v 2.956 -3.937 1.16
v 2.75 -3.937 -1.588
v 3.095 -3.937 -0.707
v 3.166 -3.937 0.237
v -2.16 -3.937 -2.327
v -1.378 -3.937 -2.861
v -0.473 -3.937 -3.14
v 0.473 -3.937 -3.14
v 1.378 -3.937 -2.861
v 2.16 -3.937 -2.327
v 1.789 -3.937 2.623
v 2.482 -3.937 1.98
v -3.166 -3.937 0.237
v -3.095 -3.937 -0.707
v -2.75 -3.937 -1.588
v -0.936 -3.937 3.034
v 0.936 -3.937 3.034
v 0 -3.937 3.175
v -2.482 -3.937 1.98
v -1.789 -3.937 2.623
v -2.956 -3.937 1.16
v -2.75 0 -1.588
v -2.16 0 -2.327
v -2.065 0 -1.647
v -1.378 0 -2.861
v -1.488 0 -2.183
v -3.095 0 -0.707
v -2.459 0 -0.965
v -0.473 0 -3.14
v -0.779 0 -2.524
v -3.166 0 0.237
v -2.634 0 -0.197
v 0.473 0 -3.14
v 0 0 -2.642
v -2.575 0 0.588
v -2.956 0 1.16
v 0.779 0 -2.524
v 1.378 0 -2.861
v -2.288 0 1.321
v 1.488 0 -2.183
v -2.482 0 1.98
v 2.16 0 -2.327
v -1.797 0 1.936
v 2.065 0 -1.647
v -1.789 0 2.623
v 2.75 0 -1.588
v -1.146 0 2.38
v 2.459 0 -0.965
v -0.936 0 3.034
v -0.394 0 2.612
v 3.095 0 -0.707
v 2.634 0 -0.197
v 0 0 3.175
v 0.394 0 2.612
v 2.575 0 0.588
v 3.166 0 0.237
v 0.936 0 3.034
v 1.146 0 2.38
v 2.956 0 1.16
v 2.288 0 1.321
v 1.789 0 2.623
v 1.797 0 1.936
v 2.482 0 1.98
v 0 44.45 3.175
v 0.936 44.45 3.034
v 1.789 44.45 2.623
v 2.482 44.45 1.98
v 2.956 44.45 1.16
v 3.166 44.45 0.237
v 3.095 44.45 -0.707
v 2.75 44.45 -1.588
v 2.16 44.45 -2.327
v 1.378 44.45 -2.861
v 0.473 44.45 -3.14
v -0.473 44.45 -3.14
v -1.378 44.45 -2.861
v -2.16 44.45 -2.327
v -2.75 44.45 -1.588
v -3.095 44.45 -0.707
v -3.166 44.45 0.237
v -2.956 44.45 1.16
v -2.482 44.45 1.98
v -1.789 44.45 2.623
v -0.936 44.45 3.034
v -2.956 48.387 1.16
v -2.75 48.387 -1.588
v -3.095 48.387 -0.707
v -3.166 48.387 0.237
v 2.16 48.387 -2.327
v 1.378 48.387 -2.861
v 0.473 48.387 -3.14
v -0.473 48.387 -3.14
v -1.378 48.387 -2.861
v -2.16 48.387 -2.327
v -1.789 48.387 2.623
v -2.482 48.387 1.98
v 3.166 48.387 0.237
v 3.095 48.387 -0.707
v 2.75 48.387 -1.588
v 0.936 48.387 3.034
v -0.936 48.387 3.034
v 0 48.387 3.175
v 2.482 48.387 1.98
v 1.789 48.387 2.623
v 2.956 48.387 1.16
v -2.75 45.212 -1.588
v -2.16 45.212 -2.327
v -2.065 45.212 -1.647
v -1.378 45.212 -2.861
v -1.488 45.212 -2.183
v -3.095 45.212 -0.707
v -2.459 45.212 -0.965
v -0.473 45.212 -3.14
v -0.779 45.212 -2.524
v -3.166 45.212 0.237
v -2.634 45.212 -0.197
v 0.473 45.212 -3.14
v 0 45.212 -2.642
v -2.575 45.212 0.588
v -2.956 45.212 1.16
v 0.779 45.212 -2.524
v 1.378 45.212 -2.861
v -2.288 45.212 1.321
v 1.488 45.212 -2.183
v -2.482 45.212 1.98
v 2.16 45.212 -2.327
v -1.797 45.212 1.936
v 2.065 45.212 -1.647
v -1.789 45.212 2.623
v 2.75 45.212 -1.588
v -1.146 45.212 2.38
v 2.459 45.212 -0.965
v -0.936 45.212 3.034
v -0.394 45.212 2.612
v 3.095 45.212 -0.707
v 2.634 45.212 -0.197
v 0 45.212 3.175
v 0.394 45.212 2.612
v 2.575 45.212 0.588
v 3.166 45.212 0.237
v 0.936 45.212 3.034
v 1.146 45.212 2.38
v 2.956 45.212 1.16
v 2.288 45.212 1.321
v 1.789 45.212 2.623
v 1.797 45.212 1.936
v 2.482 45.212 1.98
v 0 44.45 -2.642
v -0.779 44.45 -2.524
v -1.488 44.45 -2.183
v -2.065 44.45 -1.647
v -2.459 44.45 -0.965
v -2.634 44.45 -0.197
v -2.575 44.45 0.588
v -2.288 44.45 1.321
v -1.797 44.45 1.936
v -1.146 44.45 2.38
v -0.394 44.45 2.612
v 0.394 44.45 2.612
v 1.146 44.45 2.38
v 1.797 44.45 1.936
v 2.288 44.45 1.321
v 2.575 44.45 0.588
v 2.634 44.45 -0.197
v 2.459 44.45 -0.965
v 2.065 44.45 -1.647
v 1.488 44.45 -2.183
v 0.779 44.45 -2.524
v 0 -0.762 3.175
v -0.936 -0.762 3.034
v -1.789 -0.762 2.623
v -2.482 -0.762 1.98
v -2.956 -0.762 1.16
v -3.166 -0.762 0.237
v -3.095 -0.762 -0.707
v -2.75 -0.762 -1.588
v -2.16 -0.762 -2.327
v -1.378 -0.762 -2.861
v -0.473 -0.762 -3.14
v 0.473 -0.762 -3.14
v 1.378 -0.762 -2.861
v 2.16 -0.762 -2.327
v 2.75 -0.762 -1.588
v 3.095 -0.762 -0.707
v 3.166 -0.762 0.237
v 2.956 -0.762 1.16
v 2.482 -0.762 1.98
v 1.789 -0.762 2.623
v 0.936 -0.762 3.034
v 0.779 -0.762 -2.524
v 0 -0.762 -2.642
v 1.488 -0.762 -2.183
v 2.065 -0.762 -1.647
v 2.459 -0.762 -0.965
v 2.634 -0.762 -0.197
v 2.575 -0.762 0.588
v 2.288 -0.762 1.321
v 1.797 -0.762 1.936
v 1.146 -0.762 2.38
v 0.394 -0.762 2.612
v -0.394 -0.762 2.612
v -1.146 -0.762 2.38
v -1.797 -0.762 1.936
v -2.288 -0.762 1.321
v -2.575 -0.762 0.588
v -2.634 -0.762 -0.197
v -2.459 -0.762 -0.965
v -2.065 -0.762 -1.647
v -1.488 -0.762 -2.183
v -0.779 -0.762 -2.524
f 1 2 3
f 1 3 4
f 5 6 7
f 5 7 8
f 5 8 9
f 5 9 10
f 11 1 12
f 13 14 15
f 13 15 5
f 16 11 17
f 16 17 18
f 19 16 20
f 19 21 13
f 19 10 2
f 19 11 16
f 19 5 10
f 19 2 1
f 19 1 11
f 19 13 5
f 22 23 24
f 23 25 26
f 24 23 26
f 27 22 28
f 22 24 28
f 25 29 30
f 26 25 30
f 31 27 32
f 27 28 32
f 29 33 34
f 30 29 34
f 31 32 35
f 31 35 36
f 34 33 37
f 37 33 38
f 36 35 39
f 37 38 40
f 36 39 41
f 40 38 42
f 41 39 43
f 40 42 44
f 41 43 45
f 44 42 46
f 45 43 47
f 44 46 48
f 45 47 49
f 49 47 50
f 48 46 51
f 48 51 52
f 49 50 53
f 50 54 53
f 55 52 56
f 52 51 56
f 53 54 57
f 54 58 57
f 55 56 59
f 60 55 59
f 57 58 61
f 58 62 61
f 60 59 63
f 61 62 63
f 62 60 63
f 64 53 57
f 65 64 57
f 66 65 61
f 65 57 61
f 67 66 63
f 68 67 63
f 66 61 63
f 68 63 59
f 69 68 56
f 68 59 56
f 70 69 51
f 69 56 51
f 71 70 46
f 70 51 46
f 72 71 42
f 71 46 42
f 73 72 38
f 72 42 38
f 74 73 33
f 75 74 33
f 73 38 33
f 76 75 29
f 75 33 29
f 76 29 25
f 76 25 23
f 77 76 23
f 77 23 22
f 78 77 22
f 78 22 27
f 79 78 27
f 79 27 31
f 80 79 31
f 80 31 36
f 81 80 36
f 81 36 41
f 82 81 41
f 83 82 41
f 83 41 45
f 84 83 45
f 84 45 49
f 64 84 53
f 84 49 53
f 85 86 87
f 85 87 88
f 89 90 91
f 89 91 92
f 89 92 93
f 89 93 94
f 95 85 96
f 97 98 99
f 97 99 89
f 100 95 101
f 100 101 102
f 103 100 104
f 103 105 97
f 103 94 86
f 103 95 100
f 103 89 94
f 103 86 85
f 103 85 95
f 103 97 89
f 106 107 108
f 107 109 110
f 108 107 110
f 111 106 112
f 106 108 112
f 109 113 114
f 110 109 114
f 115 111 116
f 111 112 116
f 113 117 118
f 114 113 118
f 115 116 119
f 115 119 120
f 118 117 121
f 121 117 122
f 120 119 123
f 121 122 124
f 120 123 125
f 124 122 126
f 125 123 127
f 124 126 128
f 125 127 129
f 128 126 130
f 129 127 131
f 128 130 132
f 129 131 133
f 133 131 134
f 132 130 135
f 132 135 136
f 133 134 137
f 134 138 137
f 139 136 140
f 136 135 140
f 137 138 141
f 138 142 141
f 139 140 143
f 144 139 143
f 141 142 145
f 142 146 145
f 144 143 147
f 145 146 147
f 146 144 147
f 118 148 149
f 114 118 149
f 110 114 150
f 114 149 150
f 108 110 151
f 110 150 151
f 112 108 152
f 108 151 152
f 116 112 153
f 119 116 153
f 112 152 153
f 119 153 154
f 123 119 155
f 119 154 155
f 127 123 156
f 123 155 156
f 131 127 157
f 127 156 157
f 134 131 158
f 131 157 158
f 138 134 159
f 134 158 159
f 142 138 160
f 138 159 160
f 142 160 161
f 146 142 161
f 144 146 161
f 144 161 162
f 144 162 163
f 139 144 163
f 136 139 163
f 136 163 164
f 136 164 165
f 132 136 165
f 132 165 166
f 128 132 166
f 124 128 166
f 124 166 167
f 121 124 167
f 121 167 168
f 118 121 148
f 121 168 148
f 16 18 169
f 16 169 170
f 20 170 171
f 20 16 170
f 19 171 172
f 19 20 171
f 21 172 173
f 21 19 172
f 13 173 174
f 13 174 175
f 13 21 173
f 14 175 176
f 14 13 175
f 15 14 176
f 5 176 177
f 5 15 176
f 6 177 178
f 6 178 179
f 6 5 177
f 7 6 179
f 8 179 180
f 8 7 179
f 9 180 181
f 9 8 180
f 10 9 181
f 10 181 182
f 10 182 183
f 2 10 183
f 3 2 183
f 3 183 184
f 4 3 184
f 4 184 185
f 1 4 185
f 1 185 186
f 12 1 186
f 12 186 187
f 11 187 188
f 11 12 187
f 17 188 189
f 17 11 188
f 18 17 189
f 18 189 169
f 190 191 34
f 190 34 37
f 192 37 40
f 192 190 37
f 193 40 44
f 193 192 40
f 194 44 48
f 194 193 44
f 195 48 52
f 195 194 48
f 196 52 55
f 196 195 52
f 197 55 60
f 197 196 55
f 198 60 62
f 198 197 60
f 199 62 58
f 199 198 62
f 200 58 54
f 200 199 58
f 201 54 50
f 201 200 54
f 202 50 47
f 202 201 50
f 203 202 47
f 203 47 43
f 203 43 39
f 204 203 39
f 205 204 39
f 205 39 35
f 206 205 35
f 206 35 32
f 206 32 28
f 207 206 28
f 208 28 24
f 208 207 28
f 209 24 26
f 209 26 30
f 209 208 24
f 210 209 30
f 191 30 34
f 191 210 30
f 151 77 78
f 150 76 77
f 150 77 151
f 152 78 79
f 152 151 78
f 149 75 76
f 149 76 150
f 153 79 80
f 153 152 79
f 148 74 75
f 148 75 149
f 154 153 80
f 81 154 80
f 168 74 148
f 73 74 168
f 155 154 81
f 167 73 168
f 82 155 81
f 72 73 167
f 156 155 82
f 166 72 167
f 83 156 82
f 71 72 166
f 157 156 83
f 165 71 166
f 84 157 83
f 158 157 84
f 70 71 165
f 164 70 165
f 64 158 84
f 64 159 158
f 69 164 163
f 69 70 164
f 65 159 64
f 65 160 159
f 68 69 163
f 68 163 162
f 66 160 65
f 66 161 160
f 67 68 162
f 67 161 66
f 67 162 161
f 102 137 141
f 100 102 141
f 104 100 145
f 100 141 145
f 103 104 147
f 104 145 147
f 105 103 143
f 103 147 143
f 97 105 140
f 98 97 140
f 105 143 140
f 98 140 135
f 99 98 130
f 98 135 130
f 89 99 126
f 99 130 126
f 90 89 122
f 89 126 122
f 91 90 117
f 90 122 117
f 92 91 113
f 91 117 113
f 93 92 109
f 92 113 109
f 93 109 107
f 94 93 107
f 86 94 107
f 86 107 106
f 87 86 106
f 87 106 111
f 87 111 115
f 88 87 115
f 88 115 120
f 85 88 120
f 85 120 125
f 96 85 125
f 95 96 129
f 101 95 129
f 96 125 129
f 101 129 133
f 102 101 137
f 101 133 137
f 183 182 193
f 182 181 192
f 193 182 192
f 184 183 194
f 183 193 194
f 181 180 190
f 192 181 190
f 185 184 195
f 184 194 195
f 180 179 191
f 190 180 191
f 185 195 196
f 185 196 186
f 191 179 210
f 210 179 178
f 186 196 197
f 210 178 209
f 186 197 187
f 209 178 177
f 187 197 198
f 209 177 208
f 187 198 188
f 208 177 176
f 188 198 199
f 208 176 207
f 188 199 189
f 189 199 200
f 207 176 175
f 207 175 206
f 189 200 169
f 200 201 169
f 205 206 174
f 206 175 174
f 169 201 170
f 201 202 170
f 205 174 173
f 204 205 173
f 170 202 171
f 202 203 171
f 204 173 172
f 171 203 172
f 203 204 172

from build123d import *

# Parameters (mm, degrees)
SKETCH1_R           = 3.175
BOSS_EXTRUDE1_DEPTH = 44.45
SKETCH3_R           = 2.6416
BOSS_EXTRUDE2_DEPTH = 0.762
SKETCH4_R           = 3.175
BOSS_EXTRUDE3_DEPTH = 3.175
BOSS_EXTRUDE4_START = 0.762
SKETCH5_R           = 2.6416
BOSS_EXTRUDE4_DEPTH = 0.762
BOSS_EXTRUDE5_START = 3.175
SKETCH6_R           = 3.175
BOSS_EXTRUDE5_DEPTH = 3.175


with BuildPart() as part:
    # Sketch1 → Boss-Extrude1 (new body)
    with BuildSketch(Plane(origin=(0, 0, 0), x_dir=(1, 0, 0), z_dir=(0, 1, 0))):
        with Locations(Location((0, 0, 0), (0, 0, 270))):
            Circle(SKETCH1_R)
    extrude(amount=BOSS_EXTRUDE1_DEPTH)

    # Sketch3 → Boss-Extrude2 (add)
    with BuildSketch(Plane(origin=(0, 44.45, 0), x_dir=(1, 0, 0), z_dir=(0, 1, 0))):
        with Locations(Location((0, 0, 0), (0, 0, 90))):
            Circle(SKETCH3_R)
    extrude(amount=BOSS_EXTRUDE2_DEPTH)

    # Sketch4 → Boss-Extrude3 (add)
    with BuildSketch(Plane(origin=(0, 45.212, 0), x_dir=(1, 0, 0), z_dir=(0, 1, 0))):
        with Locations(Location((0, 0, 0), (0, 0, 270))):
            Circle(SKETCH4_R)
    extrude(amount=BOSS_EXTRUDE3_DEPTH)

    # Sketch5 → Boss-Extrude4 (add)
    with BuildSketch(Plane.XZ.offset(BOSS_EXTRUDE4_START)):
        with Locations(Location((0, 0, 0), (0, 0, 270))):
            Circle(SKETCH5_R)
    extrude(amount=-BOSS_EXTRUDE4_DEPTH)

    # Sketch6 → Boss-Extrude5 (add)
    with BuildSketch(Plane.XZ.offset(0.762).offset(BOSS_EXTRUDE5_START)):
        with Locations(Location((0, 0, 0), (0, 0, 90))):
            Circle(SKETCH6_R)
    extrude(amount=-BOSS_EXTRUDE5_DEPTH)


solid = part.part
